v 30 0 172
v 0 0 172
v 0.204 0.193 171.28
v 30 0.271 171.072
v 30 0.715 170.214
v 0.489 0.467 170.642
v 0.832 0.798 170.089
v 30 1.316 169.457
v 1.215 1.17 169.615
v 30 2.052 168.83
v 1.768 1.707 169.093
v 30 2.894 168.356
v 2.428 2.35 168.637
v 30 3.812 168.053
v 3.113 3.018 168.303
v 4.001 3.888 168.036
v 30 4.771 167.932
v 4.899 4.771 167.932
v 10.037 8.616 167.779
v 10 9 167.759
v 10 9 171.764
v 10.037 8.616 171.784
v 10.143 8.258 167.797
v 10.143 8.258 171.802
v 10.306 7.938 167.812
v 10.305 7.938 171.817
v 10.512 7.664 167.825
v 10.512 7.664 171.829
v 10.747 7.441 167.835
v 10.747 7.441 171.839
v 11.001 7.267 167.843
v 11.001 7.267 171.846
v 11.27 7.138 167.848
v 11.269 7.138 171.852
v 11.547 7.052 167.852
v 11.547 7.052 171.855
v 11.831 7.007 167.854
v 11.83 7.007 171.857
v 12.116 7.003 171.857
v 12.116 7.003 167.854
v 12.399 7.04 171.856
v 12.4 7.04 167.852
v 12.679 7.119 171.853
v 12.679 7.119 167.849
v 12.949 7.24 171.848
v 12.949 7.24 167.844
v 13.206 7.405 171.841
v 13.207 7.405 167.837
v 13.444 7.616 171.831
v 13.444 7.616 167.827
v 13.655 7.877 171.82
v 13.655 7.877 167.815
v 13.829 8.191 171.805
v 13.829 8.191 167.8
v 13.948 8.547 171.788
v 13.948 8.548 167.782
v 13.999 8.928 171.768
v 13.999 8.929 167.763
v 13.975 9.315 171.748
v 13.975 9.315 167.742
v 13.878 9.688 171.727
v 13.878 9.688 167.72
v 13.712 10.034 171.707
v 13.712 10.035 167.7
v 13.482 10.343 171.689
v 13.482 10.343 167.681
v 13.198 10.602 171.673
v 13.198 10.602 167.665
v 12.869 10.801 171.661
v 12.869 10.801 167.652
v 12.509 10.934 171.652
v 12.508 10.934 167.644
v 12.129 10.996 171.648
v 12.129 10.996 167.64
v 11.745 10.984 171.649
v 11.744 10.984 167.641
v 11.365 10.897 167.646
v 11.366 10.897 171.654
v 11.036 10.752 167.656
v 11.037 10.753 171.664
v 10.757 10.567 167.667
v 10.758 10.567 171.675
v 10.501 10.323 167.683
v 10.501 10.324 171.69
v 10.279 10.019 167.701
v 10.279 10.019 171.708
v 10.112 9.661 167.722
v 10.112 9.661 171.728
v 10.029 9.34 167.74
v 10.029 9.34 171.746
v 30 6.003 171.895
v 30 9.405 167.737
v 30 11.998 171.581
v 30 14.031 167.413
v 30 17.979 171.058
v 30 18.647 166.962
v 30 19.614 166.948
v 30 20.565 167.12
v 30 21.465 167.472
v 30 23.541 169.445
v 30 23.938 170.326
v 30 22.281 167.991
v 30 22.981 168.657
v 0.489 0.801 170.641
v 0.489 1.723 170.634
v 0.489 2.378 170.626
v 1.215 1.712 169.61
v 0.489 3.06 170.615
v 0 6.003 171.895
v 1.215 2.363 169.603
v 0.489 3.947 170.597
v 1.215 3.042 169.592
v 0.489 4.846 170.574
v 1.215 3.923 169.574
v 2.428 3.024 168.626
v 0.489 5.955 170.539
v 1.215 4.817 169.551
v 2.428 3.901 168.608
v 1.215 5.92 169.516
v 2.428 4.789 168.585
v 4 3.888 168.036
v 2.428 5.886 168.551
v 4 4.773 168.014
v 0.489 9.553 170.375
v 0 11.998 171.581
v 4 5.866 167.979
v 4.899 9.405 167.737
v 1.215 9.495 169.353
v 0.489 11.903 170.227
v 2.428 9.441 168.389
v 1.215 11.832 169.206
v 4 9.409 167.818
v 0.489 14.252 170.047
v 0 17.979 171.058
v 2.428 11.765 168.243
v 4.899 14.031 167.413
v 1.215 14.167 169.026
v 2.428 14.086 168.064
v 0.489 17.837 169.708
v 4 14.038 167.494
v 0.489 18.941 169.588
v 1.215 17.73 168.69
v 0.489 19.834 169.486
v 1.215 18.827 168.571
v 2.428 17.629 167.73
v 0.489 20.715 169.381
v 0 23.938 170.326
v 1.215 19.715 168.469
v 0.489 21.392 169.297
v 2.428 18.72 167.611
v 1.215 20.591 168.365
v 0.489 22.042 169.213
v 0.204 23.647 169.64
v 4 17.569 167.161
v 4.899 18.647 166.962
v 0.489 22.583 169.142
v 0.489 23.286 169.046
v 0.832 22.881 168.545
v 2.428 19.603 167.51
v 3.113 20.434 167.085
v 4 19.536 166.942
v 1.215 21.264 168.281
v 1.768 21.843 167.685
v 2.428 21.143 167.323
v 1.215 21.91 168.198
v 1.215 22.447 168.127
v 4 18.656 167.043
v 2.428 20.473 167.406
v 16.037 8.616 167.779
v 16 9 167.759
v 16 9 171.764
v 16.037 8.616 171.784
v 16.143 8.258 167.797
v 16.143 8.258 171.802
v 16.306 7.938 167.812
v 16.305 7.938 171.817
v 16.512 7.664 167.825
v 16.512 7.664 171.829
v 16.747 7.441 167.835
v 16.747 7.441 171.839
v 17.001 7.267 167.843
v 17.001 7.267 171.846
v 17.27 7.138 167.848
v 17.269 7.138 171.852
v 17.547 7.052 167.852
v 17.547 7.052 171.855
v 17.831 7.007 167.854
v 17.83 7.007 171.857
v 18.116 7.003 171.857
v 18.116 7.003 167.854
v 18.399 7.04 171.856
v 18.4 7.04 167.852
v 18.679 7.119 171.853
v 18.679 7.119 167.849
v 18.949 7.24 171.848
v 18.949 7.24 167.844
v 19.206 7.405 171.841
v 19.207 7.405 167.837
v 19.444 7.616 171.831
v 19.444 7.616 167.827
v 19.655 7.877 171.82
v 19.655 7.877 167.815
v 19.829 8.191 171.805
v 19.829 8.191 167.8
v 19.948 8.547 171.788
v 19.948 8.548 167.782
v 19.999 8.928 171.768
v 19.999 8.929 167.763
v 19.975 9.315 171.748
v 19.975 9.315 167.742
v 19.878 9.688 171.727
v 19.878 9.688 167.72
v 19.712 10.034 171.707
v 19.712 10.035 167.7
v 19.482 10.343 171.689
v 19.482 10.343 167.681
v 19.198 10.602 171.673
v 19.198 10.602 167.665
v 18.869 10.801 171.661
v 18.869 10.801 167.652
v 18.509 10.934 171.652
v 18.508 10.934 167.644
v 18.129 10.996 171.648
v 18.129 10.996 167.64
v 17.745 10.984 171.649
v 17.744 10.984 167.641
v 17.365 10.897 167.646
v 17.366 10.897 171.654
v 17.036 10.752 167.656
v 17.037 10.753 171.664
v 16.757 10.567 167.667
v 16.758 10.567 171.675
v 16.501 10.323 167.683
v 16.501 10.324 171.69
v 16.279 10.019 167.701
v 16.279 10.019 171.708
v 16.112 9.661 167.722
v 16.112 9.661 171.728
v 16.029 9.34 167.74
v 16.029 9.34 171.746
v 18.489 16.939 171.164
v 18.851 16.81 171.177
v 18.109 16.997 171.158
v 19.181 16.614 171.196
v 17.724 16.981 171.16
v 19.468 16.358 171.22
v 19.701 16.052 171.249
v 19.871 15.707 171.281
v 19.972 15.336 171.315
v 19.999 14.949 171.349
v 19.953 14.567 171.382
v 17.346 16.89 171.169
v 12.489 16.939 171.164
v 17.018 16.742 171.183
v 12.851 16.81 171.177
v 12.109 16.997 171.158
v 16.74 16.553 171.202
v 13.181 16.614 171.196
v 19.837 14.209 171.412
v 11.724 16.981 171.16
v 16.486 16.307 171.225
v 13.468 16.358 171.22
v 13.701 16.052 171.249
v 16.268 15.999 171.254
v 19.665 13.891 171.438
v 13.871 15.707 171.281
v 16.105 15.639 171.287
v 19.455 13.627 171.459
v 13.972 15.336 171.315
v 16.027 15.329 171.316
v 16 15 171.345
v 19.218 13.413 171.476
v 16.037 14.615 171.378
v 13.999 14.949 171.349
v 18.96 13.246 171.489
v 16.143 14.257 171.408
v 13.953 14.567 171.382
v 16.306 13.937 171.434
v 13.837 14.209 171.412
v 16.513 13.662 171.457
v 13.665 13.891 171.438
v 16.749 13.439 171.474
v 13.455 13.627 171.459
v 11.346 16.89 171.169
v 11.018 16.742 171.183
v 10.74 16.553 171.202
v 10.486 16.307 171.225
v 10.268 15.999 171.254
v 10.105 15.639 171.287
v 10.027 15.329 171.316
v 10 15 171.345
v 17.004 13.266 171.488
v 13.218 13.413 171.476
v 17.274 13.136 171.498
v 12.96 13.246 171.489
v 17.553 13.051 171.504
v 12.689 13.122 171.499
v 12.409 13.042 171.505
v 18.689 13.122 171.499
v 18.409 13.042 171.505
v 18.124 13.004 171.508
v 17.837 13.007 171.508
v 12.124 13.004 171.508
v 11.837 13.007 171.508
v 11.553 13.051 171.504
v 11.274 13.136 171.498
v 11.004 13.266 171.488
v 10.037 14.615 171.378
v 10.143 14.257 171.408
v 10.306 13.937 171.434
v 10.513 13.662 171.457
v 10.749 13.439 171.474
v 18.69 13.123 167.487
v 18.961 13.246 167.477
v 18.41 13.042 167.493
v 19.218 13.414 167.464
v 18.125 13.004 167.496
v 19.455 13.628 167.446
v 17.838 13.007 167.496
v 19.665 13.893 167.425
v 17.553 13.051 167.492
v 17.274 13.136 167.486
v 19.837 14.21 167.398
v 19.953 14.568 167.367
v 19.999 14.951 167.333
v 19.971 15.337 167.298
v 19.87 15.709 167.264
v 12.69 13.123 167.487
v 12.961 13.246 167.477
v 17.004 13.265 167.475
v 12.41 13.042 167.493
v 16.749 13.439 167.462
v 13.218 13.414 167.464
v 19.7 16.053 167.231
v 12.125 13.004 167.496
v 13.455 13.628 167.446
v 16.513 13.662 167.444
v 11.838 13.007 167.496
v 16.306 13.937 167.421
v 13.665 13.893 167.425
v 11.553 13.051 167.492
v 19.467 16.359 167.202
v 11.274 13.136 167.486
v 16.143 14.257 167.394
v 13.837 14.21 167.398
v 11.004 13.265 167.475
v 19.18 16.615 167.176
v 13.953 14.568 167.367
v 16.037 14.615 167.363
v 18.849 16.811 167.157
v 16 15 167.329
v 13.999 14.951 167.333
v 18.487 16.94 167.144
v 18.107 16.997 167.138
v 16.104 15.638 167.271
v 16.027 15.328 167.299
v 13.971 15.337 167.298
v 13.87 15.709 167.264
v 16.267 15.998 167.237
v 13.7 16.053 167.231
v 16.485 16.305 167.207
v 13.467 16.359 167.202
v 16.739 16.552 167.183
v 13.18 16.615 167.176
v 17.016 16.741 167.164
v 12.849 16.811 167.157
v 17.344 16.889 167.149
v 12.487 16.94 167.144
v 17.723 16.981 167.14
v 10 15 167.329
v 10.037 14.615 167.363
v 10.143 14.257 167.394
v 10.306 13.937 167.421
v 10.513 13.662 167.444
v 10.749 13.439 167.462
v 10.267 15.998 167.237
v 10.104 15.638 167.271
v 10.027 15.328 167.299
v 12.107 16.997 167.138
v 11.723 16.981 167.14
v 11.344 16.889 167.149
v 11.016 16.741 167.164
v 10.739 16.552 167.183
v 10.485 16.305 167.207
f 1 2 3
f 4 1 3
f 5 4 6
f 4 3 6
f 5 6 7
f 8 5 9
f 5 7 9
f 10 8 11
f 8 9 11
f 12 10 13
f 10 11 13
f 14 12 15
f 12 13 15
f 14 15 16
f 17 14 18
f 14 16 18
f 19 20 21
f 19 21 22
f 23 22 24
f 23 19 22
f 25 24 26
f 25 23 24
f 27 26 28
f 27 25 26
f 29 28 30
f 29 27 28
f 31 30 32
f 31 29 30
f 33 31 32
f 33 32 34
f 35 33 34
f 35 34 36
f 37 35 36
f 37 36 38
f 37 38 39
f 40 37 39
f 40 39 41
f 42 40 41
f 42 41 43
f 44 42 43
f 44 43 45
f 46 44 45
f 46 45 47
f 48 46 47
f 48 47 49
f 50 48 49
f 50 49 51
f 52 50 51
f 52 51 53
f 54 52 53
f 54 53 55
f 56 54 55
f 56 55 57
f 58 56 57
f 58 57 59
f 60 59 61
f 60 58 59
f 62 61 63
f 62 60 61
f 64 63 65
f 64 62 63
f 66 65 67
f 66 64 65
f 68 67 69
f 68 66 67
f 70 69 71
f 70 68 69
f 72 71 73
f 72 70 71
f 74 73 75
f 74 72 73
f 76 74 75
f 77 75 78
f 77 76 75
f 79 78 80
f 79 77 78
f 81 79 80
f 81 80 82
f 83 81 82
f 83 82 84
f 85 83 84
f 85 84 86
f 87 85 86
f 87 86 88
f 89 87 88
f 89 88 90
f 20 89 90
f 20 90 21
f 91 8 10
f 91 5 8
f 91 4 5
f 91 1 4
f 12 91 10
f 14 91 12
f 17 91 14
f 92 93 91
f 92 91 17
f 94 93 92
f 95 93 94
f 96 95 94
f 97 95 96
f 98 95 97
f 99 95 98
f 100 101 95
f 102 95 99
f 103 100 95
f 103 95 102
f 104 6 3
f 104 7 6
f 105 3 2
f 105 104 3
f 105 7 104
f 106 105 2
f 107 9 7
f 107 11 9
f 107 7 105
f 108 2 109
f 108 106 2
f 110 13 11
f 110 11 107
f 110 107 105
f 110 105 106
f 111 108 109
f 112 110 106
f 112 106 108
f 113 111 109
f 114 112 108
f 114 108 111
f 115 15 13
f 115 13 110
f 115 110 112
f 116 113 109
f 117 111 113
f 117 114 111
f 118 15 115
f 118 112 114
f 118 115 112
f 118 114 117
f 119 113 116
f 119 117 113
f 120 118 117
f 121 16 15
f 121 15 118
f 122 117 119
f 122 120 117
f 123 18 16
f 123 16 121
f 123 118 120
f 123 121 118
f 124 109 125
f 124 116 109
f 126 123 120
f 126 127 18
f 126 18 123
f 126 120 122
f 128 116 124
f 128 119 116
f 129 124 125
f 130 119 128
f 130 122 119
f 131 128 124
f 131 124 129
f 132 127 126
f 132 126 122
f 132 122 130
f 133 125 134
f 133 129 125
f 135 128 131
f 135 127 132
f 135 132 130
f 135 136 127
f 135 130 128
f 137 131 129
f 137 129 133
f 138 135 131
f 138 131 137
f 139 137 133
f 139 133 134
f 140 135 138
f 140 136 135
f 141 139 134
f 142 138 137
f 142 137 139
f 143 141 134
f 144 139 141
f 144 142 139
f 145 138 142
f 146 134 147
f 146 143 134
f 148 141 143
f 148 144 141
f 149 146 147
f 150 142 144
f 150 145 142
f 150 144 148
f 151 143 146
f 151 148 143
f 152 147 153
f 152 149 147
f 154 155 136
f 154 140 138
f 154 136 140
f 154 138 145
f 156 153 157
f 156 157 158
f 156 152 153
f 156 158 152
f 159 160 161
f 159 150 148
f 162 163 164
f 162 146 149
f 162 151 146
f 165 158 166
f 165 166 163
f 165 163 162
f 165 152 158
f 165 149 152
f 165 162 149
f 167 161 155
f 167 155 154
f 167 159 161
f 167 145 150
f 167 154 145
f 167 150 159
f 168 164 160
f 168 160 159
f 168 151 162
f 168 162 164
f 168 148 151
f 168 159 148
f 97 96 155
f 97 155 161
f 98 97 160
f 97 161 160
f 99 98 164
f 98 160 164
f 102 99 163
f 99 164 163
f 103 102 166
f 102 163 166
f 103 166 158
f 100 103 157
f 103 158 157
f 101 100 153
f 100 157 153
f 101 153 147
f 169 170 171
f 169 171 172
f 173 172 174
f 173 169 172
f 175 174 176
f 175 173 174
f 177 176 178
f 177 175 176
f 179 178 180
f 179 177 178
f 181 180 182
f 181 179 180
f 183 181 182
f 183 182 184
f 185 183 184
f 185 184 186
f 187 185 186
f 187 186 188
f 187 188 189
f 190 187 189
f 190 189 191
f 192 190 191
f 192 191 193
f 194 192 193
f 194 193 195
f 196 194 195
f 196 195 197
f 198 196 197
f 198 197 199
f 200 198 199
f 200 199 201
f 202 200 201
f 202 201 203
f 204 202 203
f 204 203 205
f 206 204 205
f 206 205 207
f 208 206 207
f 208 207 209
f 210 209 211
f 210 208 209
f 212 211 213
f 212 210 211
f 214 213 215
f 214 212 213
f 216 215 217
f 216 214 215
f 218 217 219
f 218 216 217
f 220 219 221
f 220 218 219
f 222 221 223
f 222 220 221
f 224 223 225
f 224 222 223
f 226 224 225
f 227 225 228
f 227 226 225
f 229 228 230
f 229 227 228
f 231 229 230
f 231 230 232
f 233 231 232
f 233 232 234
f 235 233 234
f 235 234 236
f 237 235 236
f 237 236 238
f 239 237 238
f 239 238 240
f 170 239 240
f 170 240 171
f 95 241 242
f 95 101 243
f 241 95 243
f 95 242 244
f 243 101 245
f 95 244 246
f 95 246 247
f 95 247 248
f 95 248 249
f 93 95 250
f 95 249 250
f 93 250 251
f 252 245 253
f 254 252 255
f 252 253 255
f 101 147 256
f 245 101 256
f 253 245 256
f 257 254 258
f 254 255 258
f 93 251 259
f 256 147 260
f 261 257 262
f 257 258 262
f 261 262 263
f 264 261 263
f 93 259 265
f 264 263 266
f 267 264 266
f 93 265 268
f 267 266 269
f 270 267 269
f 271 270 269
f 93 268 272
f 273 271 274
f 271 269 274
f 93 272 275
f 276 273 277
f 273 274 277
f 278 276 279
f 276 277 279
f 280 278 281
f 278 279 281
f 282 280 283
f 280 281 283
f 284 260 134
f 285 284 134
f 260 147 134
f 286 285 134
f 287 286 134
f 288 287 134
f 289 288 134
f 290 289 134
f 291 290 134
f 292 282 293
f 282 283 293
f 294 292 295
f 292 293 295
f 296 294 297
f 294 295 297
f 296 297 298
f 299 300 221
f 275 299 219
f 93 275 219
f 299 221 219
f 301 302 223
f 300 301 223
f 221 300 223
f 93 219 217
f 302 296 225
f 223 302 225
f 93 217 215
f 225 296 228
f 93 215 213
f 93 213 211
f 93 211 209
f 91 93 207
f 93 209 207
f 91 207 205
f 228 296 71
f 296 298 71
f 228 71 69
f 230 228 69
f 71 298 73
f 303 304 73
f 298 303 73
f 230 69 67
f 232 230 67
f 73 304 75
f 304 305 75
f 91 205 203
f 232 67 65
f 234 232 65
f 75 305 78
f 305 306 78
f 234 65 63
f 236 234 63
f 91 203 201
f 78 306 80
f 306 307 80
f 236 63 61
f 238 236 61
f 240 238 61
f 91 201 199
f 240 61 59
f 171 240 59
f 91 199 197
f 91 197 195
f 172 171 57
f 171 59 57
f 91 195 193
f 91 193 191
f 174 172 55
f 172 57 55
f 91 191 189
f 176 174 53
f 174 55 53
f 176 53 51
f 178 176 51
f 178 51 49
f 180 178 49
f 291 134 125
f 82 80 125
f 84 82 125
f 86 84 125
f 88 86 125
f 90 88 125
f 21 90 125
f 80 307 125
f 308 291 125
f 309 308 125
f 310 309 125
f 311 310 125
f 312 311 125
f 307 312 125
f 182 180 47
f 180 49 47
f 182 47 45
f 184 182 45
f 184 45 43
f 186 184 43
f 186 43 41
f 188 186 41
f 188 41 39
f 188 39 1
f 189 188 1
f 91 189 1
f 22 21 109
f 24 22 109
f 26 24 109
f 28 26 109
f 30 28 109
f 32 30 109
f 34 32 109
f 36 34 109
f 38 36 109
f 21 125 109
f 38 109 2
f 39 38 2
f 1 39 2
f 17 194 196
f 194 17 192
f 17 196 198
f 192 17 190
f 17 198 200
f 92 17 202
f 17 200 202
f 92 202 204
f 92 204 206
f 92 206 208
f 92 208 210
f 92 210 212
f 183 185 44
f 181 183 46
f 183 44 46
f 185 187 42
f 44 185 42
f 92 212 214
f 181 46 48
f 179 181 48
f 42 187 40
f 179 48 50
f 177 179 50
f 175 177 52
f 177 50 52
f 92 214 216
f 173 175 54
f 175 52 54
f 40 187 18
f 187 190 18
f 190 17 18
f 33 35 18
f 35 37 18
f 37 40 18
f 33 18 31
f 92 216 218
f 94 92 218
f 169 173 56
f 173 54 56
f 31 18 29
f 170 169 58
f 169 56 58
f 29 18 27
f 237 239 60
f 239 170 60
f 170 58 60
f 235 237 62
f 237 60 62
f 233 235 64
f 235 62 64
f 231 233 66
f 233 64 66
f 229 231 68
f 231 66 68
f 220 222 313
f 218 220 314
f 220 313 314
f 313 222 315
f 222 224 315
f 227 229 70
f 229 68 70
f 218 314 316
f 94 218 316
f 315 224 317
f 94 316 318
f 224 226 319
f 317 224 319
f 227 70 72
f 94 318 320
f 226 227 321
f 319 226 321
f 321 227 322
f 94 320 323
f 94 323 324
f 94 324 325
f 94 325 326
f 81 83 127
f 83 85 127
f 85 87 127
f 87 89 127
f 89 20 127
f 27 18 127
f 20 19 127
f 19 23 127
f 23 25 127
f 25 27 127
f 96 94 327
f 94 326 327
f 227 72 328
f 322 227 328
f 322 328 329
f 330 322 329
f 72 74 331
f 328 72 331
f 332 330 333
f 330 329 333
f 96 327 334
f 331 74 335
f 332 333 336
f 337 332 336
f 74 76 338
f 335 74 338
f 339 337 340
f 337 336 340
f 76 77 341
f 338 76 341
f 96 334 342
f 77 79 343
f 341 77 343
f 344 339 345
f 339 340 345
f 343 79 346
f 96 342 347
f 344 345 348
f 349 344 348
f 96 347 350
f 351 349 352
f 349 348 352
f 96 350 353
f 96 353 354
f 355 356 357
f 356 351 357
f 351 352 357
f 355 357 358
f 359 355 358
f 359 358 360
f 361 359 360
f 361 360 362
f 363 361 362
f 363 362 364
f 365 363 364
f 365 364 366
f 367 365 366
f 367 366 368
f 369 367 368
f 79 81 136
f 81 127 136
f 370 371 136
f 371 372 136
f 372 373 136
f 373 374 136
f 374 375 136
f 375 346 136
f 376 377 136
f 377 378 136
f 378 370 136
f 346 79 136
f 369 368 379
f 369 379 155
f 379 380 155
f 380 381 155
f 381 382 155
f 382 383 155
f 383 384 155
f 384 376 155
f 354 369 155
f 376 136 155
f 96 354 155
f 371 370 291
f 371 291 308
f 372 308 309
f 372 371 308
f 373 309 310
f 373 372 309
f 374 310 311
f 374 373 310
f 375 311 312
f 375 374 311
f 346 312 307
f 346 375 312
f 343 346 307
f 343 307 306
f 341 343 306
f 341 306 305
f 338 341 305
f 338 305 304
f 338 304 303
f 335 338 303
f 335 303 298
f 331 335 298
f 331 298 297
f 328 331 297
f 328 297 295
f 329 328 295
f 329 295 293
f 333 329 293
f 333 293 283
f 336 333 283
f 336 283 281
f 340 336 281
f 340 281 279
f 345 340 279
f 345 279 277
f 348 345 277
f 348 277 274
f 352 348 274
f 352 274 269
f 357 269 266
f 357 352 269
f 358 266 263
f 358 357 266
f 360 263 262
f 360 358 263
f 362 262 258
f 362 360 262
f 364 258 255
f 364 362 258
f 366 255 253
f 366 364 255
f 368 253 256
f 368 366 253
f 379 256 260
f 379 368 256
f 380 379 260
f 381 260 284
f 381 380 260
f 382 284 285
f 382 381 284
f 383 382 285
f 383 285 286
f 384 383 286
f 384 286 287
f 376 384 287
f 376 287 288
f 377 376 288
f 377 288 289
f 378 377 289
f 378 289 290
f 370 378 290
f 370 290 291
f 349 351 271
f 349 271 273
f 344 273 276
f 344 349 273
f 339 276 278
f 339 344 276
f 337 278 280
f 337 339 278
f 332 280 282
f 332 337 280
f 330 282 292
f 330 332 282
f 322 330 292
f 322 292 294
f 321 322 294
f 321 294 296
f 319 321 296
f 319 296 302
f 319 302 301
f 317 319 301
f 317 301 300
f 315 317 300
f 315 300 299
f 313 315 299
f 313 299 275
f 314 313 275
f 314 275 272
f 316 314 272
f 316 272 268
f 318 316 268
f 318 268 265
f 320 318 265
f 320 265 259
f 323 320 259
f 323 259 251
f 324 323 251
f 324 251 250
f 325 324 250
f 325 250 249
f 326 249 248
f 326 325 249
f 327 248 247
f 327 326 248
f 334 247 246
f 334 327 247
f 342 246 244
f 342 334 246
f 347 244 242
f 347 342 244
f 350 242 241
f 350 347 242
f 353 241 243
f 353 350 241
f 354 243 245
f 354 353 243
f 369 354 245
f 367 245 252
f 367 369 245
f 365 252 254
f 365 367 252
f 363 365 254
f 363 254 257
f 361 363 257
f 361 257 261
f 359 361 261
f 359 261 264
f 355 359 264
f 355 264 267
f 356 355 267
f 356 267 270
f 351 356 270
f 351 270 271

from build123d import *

# Parameters (mm, degrees)
SALIENTE_EXTRUIR1_DEPTH = 30
REDONDEO1_R             = 5
CROQUIS2_R              = 2
CORTAR_EXTRUIR1_DEPTH   = 41.197257902


with BuildPart() as part:
    # Croquis1 → Saliente-Extruir1 (new body)
    with BuildSketch(Plane(origin=(0, 0, 0), x_dir=(0, 0, -1), z_dir=(1, 0, 0))):
        with BuildLine():
            Line((-172, 0), (-168, 0))
            ThreePointArc((-168, 0), (-167.590760444, 11.719087589), (-166.365035549, 23.381080961))
            Line((-166.365035549, 23.381080961), (-170.326107824, 23.937773365))
            ThreePointArc((-170.326107824, 23.937773365), (-171.581016645, 11.998113484), (-172, 0))
        make_face()
    extrude(amount=SALIENTE_EXTRUIR1_DEPTH)

    # Redondeo1
    # the kernel refuses this fillet: 5 mm, written as the material it takes off along each edge
    with BuildSketch(Plane(origin=(-11.928000159, 0, 168), x_dir=(0, 0, 1), z_dir=(1, 0, 0))) as redondeo1_piece_1:
        with BuildLine():
            CenterArc((4.930232558, -4.912704692), REDONDEO1_R, 100.722152416, 77.650592735)
            Line((-0.067751042, -4.770719007), (-0.167710714, -4.767879293))
            ThreePointArc((-0.167710714, -4.767879293), (-0.116928532, -2.384180032), (-0.1, 0))
            Line((-0.1, 0), (0, 0.1))
            ThreePointArc((0, 0.1), (2, 0.1), (3.981395349, 0.098254094))
            Line((3.981395349, 0.098254094), (4, 0))
        make_face()
    redondeo1_piece_1_solid = extrude(amount=53.856000318, mode=Mode.PRIVATE)
    with BuildSketch(Plane(origin=(0, 0, 0), x_dir=(0, -0.07283715429145175, 0.9973438469027236), z_dir=(0, -0.9973438469027236, -0.07283715429145175))) as redondeo1_piece_2:
        with BuildLine():
            CenterArc((173, -4.898979486), REDONDEO1_R, 101.536959033, 78.463040967)
            Line((172, 0), (171.98, 0.09797959))
            ThreePointArc((171.98, 0.09797959), (170, 0.1), (168, 0.1))
            Line((168, 0.1), (167.9, 0))
            Line((167.9, 0), (167.9, -4.898979486))
            Line((167.9, -4.898979486), (168, -4.898979486))
        make_face()
    redondeo1_piece_2_solid = revolve(axis=Axis((0, 0, 0), (-1, 0, 0)), revolution_arc=16.353920807, mode=Mode.PRIVATE)
    with BuildSketch(Plane(origin=(-11.928000159, 23.381080961, 166.365035549), x_dir=(0, -0.9921444829388189, 0.12509726205662378), z_dir=(1, 0, 0))) as redondeo1_piece_3:
        with BuildLine():
            CenterArc((4.842200065, -4.999495875), REDONDEO1_R, 90.813627425, 77.650592735)
            Line((-0.056800001, -3.9995967), (-0.154780002, -3.979598716))
            ThreePointArc((-0.154780002, -3.979598716), (-0.128389918, -1.99837835), (-0.099989917, 0.00142))
            Line((-0.099989917, 0.00142), (0.00142, 0.099989917))
            ThreePointArc((0.00142, 0.099989917), (2.385600032, 0.083061386), (4.769780064, 0.099989917))
            Line((4.769780064, 0.099989917), (4.771200064, 0))
        make_face()
    redondeo1_piece_3_solid = extrude(amount=53.856000318, mode=Mode.PRIVATE)
    add([redondeo1_piece_1_solid, redondeo1_piece_2_solid, redondeo1_piece_3_solid], mode=Mode.SUBTRACT)

    # Croquis2 → Cortar-Extruir1 (cut, through all)
    with BuildSketch(Plane.XY.offset(160.05)):
        with Locations(Location((18, 15, 0), (0, 0, 180))):
            Circle(CROQUIS2_R)
        with Locations(Location((12, 15, 0), (0, 0, 180))):
            Circle(CROQUIS2_R)
        with Locations(Location((18, 9, 0), (0, 0, 180))):
            Circle(CROQUIS2_R)
        with Locations(Location((12, 9, 0), (0, 0, 180))):
            Circle(CROQUIS2_R)
    extrude(amount=CORTAR_EXTRUIR1_DEPTH, mode=Mode.SUBTRACT)


solid = part.part
